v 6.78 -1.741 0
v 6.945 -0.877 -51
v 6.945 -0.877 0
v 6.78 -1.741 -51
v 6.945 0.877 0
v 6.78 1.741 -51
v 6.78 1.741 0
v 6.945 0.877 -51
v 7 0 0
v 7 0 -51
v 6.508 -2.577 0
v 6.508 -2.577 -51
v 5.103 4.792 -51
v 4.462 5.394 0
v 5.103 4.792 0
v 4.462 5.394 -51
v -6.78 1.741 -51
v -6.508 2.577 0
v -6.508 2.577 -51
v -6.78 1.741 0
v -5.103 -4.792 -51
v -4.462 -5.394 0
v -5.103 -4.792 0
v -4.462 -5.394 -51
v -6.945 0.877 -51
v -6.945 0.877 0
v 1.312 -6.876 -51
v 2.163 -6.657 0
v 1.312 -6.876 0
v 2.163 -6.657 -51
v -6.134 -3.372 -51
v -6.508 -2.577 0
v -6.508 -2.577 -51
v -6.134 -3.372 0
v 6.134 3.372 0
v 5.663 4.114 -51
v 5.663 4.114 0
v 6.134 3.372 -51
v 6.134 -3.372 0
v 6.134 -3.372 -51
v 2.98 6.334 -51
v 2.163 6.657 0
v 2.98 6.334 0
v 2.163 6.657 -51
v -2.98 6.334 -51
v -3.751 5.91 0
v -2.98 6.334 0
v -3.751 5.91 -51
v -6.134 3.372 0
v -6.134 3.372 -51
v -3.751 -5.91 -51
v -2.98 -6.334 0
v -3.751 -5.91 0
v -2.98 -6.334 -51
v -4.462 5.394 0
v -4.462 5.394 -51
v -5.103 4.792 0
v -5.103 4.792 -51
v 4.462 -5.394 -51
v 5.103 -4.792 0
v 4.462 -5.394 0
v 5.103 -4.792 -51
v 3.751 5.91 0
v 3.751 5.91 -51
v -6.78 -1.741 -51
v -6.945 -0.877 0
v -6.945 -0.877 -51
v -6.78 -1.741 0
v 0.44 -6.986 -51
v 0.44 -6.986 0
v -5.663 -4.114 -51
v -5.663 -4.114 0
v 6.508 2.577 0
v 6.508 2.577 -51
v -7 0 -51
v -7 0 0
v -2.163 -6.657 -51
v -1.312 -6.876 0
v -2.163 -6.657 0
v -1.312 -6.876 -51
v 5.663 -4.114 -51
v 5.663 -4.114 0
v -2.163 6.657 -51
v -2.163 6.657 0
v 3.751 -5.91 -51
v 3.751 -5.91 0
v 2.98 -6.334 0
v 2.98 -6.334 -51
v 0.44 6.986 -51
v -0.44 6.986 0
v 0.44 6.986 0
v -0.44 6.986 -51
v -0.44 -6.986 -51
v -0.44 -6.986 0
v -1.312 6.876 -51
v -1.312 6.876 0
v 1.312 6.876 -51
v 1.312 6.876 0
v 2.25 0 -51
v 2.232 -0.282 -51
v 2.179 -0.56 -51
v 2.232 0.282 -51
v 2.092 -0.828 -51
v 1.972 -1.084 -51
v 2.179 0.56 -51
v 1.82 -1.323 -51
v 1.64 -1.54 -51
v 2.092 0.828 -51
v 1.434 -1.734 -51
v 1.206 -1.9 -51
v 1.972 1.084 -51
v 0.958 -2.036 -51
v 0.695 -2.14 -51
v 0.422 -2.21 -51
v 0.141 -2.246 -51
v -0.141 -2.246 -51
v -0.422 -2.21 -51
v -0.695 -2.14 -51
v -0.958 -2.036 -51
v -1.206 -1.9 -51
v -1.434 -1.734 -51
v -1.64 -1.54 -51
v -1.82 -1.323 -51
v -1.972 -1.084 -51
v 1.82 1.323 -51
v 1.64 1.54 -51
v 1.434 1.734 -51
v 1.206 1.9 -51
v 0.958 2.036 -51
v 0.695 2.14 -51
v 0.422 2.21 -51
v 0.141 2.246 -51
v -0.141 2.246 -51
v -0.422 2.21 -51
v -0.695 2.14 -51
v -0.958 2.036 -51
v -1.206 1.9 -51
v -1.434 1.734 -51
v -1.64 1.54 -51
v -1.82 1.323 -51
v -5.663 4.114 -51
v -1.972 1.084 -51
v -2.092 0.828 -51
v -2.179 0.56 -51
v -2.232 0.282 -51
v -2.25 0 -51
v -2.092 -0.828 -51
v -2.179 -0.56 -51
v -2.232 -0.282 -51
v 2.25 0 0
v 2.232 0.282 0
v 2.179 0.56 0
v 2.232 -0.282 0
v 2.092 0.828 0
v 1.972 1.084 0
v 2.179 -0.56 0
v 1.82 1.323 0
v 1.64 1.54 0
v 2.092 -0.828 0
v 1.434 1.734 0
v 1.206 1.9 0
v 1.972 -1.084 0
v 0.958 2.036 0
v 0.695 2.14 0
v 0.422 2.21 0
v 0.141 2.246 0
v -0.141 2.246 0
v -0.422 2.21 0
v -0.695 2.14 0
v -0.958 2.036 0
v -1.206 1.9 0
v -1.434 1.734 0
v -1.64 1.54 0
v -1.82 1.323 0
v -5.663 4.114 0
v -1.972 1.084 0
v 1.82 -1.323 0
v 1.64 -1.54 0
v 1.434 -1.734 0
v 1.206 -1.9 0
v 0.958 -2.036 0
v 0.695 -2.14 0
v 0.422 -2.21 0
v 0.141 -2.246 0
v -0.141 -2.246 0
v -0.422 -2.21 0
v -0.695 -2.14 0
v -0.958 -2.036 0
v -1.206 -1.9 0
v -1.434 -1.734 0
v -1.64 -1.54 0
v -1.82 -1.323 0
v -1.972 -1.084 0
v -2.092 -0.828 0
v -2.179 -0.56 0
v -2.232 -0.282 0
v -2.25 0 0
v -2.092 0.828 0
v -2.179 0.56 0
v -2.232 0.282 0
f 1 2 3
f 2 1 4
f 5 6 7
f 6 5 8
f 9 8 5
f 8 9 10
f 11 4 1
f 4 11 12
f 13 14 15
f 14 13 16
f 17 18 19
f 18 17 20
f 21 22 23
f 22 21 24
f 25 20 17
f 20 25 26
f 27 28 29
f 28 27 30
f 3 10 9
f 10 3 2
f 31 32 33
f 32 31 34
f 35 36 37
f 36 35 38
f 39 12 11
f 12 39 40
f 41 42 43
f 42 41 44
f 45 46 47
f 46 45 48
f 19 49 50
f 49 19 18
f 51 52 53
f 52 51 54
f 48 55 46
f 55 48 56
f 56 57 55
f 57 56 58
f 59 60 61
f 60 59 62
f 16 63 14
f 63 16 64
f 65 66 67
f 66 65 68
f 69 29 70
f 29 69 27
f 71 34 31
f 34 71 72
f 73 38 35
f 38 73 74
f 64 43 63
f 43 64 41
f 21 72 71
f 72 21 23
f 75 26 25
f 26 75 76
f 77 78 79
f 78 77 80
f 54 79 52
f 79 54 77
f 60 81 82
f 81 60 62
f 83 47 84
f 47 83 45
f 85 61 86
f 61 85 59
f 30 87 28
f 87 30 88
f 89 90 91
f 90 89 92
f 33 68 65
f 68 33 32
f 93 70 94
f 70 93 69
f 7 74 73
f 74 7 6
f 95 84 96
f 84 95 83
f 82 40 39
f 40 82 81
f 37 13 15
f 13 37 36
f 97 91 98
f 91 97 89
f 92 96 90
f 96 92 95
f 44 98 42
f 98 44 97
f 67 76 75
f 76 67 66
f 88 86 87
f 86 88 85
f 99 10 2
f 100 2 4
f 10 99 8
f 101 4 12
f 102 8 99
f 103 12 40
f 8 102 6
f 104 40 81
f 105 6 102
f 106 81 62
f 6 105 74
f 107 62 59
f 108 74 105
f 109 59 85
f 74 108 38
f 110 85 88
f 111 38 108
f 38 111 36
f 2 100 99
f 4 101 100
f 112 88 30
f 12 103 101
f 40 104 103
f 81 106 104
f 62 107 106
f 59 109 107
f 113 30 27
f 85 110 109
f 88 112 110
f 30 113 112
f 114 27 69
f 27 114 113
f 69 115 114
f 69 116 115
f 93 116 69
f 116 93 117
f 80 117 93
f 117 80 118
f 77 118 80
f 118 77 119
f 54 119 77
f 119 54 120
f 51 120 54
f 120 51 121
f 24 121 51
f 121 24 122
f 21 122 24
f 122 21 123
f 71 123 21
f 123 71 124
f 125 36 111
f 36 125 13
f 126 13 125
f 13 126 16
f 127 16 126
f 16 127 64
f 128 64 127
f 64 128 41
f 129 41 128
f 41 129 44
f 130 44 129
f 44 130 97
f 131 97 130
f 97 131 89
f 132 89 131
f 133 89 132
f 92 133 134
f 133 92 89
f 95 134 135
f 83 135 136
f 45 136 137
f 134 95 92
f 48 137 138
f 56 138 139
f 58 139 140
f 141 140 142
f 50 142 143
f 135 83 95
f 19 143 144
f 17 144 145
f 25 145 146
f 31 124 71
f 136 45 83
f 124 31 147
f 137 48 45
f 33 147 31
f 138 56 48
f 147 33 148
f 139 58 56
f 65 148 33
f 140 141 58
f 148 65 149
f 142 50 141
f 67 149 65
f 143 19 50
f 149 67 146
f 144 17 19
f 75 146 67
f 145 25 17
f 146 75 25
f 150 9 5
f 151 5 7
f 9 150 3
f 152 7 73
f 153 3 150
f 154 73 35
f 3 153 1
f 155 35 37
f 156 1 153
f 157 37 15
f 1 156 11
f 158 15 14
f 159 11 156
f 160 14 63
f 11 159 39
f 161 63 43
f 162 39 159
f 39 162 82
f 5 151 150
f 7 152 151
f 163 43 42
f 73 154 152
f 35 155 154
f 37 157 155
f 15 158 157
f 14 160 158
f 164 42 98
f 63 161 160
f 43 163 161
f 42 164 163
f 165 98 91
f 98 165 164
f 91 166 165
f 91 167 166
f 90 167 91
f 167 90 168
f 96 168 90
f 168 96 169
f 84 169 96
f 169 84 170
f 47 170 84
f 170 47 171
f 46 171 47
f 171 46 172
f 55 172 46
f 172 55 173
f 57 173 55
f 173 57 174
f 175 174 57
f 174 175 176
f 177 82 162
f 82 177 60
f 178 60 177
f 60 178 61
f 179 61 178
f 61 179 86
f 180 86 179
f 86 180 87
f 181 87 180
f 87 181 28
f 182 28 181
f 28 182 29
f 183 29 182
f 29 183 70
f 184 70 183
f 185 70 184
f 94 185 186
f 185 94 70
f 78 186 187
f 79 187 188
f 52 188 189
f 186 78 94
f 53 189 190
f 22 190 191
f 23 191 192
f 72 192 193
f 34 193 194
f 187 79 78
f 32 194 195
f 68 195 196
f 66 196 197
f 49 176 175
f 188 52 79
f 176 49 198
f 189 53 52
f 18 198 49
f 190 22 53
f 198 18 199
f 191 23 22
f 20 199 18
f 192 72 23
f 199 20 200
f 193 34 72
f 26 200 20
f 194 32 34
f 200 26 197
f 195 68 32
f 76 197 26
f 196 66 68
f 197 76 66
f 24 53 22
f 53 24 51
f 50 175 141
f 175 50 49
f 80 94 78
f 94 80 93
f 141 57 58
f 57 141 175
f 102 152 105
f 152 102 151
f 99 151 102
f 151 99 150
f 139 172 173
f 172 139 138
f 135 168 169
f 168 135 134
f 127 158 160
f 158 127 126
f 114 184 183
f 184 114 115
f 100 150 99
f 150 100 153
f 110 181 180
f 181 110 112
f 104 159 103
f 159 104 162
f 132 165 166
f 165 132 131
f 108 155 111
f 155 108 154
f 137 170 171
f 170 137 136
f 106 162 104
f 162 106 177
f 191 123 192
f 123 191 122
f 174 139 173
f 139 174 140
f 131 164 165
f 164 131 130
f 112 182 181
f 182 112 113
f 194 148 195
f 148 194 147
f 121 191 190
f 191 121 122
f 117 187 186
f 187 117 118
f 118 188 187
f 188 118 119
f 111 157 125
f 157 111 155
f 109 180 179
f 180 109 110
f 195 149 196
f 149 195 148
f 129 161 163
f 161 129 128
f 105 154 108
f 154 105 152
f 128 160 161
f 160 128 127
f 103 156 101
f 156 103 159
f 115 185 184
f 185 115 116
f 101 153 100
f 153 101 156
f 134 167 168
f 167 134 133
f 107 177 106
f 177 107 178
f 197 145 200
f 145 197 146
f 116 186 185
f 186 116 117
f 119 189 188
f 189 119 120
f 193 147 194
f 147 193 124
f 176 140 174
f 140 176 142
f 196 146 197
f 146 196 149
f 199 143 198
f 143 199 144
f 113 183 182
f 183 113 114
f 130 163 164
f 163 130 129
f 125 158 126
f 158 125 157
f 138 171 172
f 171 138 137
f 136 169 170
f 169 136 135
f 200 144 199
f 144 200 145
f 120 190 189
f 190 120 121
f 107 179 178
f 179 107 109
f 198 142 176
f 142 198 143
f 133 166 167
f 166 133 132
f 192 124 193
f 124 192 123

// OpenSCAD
$fn = 50;


difference() {
	union() {
		translate(v = [0, 0, -51.0000000000]) {
			cylinder(h = 51, r = 7.0000000000);
		}
		cylinder(h = 0, r = 17.0000000000);
	}
	union() {
		#translate(v = [0, 0, -51]) {
			cylinder(h = 51, r = 2.2500000000);
		}
	}
}
